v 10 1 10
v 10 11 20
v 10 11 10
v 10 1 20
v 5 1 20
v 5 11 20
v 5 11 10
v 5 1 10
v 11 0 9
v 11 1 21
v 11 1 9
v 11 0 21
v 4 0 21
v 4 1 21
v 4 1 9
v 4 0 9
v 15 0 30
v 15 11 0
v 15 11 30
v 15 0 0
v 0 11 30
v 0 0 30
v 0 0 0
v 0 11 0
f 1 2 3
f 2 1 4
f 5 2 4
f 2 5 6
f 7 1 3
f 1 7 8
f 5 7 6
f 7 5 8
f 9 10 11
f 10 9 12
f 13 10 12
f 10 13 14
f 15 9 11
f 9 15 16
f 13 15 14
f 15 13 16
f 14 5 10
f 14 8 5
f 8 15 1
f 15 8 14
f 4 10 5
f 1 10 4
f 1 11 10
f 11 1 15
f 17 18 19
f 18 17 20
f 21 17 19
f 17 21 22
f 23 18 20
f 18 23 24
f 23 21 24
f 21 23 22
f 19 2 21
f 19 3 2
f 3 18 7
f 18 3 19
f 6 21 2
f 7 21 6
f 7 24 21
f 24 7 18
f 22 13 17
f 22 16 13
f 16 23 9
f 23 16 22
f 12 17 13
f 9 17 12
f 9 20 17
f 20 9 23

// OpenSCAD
socketLength = 5; // x
socketWidth = 10; // z
socketDepth = 10; // y

verticalOffSet = 10;
horizontalOffset = 5;

holeLength = socketLength;
holeWidth = socketWidth;
holeDepth = socketDepth + 1;

difference() {
    cube ([holeLength + horizontalOffset * 2,holeDepth,socketWidth + verticalOffSet * 2]);

    union() {
    translate ([horizontalOffset,-1,verticalOffSet])
    cube ([socketLength,holeDepth + 2 ,holeWidth]);
    translate ([horizontalOffset - 1,-1,verticalOffSet - 1])
    cube ([socketLength + 2,2 ,holeWidth + 2]);
    }
}
